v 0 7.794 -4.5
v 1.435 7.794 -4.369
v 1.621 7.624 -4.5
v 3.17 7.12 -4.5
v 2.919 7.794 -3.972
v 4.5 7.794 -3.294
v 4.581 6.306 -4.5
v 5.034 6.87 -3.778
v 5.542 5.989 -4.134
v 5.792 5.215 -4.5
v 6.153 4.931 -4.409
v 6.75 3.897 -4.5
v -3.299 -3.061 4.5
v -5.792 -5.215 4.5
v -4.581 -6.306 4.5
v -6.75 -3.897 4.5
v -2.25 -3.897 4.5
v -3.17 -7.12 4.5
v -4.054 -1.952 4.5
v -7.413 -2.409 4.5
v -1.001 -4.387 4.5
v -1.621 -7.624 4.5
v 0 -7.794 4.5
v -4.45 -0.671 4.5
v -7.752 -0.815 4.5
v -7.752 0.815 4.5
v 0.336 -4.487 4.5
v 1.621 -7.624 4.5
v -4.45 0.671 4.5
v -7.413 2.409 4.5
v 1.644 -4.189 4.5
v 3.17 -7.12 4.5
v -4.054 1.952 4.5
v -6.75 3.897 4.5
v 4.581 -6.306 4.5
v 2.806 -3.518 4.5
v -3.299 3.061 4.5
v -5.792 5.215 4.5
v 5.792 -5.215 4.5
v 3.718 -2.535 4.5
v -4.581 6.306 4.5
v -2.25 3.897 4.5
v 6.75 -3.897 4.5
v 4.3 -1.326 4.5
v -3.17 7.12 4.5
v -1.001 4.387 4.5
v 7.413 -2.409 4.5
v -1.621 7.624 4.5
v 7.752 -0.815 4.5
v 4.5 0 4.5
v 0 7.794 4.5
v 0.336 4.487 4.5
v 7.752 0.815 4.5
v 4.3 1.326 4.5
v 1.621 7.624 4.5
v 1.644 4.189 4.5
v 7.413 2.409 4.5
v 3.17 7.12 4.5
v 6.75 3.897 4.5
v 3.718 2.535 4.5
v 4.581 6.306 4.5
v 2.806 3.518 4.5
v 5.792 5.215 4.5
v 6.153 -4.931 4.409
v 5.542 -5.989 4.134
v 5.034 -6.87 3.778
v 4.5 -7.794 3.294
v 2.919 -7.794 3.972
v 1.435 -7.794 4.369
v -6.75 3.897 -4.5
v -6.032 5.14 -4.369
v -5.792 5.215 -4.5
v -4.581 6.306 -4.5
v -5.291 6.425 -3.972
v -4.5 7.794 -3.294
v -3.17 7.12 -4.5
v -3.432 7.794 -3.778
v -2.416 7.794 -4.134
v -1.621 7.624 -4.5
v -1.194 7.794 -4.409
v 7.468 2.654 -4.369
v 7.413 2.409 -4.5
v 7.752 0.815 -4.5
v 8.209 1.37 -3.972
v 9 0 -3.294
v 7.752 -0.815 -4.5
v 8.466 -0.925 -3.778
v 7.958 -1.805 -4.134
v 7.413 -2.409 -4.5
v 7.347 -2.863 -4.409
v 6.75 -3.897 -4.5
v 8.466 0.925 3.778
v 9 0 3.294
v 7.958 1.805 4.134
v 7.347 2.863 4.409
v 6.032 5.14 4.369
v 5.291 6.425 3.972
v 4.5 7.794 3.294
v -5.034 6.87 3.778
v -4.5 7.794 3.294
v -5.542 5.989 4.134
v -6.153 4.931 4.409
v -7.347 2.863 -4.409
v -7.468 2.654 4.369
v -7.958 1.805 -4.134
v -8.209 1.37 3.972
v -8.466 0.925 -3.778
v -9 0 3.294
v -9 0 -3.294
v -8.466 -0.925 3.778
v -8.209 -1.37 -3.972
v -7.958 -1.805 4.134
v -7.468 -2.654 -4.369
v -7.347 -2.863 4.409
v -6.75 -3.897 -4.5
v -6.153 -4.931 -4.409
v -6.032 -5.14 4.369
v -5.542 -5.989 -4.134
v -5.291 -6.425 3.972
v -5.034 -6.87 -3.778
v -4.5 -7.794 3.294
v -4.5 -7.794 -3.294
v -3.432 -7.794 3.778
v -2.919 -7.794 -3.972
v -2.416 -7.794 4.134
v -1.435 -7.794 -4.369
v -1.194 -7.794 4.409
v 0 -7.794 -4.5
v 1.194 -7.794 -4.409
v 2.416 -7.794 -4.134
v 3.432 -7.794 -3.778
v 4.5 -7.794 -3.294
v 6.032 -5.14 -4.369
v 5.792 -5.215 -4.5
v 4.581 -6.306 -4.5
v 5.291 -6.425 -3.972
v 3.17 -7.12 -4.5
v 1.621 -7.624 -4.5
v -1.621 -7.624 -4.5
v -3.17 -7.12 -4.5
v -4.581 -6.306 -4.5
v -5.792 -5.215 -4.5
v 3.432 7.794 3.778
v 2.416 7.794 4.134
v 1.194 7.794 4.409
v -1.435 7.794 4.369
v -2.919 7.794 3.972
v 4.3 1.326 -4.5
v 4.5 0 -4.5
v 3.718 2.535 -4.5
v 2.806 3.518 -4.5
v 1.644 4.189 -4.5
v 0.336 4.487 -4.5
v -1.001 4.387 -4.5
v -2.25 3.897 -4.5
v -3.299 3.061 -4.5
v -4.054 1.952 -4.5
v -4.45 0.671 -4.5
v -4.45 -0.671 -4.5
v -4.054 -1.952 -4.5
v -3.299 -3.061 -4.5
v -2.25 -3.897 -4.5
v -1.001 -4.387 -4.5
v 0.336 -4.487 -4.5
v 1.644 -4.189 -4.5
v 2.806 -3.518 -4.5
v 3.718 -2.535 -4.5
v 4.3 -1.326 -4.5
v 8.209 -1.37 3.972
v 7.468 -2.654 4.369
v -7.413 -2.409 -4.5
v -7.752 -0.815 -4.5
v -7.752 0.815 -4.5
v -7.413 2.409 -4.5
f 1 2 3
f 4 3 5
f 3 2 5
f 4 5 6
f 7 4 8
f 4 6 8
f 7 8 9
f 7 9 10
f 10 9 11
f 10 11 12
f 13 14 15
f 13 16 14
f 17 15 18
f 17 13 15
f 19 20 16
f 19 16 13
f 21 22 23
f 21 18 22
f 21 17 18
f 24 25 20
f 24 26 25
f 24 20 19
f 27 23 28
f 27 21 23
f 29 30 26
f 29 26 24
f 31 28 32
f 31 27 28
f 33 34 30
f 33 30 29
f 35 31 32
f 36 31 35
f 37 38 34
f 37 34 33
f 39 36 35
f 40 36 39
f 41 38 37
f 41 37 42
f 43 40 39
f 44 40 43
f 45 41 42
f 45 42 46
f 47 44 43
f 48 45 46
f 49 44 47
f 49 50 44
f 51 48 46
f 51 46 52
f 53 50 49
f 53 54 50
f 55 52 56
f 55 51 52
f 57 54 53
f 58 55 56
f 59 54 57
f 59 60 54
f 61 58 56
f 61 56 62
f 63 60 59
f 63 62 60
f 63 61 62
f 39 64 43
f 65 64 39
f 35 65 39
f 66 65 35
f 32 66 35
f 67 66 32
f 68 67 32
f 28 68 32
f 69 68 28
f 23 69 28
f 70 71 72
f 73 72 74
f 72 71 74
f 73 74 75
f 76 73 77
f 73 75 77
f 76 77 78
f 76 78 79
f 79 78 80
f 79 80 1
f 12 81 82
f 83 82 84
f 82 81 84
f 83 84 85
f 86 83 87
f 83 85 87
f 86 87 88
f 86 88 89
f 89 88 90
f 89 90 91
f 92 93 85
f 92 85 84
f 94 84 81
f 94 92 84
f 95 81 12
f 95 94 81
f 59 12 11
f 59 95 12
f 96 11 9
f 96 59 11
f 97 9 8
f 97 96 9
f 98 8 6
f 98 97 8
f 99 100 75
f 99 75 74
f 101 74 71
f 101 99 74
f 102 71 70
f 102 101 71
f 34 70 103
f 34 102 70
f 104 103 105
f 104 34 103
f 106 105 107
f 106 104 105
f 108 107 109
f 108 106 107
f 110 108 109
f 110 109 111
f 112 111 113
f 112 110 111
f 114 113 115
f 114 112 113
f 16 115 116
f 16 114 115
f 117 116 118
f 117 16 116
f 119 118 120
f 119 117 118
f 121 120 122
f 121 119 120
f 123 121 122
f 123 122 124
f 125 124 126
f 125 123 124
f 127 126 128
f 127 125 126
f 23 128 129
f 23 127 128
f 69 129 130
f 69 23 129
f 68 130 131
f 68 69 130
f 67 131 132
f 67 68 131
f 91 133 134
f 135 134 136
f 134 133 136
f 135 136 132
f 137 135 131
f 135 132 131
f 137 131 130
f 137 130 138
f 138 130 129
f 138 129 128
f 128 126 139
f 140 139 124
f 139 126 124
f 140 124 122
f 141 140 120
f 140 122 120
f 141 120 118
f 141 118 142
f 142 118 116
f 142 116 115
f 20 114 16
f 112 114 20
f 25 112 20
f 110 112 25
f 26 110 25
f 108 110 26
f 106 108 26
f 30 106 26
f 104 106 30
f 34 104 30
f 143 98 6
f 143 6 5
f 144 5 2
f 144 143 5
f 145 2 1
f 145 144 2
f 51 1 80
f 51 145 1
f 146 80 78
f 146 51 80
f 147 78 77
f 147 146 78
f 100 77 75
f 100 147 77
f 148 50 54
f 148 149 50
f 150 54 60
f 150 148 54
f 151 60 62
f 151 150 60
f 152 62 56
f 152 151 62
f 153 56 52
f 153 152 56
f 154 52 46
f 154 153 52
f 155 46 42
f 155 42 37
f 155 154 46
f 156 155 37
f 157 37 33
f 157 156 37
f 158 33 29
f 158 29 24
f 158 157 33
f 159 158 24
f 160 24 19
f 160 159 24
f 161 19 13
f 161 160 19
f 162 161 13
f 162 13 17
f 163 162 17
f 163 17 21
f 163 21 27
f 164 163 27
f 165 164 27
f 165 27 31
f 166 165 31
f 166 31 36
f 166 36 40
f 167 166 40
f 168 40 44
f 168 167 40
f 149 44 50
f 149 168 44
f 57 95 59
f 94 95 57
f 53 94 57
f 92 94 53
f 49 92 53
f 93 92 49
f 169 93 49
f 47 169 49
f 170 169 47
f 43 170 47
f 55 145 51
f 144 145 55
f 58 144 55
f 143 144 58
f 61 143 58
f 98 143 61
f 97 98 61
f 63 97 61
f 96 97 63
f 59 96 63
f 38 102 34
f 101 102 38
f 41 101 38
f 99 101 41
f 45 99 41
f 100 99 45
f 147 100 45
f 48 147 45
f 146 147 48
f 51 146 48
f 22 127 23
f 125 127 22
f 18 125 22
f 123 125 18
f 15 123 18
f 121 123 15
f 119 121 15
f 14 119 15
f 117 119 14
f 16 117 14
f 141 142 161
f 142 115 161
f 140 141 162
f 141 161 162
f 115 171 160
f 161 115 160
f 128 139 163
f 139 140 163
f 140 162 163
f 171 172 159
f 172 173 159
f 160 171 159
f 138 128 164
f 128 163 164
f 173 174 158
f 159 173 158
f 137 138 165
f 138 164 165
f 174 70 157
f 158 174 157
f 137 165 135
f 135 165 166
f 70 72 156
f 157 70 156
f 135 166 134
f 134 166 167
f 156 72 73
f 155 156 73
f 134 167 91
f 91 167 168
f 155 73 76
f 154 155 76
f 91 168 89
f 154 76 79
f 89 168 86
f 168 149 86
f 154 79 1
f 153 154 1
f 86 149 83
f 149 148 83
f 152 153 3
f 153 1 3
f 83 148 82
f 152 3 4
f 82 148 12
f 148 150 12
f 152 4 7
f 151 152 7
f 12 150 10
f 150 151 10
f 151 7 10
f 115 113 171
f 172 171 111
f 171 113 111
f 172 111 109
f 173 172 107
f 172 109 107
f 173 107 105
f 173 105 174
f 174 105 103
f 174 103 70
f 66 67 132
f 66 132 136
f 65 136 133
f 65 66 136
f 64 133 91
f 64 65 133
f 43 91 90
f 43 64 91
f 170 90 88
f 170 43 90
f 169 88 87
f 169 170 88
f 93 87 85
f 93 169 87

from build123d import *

# Parameters (mm, degrees)
SKETCH1_R           = 4.5
BOSS_EXTRUDE3_DEPTH = 4.5
SKETCH3_OUTSIDE_W   = 43.092
SKETCH3_OUTSIDE_H   = 40.68
SKETCH3_OUTSIDE_R   = 7.794228634
CUT_EXTRUDE5_DEPTH  = 9
CUT_EXTRUDE5_TAPER  = 45


with BuildPart() as part:
    # Sketch1 → Boss-Extrude3 (new body, symmetric)
    with BuildSketch(Plane.XY):
        Polygon((9, 0), (4.5, 7.794228634), (-4.5, 7.794228634), (-9, 0), (-4.5, -7.794228634), (4.5, -7.794228634), align=None)
        Circle(SKETCH1_R, mode=Mode.SUBTRACT)
    extrude(amount=BOSS_EXTRUDE3_DEPTH, both=True)

    # Sketch3 outside → Cut-Extrude5 (cut)
    with BuildSketch(Plane.XY.offset(4.5)):
        Rectangle(SKETCH3_OUTSIDE_W, SKETCH3_OUTSIDE_H)
        Circle(SKETCH3_OUTSIDE_R, mode=Mode.SUBTRACT)
    cut_extrude5 = extrude(amount=-CUT_EXTRUDE5_DEPTH, taper=CUT_EXTRUDE5_TAPER, mode=Mode.SUBTRACT)

    # Mirror2: Cut-Extrude5 across plane
    add(cut_extrude5.mirror(Plane.XY), mode=Mode.SUBTRACT)


solid = part.part
